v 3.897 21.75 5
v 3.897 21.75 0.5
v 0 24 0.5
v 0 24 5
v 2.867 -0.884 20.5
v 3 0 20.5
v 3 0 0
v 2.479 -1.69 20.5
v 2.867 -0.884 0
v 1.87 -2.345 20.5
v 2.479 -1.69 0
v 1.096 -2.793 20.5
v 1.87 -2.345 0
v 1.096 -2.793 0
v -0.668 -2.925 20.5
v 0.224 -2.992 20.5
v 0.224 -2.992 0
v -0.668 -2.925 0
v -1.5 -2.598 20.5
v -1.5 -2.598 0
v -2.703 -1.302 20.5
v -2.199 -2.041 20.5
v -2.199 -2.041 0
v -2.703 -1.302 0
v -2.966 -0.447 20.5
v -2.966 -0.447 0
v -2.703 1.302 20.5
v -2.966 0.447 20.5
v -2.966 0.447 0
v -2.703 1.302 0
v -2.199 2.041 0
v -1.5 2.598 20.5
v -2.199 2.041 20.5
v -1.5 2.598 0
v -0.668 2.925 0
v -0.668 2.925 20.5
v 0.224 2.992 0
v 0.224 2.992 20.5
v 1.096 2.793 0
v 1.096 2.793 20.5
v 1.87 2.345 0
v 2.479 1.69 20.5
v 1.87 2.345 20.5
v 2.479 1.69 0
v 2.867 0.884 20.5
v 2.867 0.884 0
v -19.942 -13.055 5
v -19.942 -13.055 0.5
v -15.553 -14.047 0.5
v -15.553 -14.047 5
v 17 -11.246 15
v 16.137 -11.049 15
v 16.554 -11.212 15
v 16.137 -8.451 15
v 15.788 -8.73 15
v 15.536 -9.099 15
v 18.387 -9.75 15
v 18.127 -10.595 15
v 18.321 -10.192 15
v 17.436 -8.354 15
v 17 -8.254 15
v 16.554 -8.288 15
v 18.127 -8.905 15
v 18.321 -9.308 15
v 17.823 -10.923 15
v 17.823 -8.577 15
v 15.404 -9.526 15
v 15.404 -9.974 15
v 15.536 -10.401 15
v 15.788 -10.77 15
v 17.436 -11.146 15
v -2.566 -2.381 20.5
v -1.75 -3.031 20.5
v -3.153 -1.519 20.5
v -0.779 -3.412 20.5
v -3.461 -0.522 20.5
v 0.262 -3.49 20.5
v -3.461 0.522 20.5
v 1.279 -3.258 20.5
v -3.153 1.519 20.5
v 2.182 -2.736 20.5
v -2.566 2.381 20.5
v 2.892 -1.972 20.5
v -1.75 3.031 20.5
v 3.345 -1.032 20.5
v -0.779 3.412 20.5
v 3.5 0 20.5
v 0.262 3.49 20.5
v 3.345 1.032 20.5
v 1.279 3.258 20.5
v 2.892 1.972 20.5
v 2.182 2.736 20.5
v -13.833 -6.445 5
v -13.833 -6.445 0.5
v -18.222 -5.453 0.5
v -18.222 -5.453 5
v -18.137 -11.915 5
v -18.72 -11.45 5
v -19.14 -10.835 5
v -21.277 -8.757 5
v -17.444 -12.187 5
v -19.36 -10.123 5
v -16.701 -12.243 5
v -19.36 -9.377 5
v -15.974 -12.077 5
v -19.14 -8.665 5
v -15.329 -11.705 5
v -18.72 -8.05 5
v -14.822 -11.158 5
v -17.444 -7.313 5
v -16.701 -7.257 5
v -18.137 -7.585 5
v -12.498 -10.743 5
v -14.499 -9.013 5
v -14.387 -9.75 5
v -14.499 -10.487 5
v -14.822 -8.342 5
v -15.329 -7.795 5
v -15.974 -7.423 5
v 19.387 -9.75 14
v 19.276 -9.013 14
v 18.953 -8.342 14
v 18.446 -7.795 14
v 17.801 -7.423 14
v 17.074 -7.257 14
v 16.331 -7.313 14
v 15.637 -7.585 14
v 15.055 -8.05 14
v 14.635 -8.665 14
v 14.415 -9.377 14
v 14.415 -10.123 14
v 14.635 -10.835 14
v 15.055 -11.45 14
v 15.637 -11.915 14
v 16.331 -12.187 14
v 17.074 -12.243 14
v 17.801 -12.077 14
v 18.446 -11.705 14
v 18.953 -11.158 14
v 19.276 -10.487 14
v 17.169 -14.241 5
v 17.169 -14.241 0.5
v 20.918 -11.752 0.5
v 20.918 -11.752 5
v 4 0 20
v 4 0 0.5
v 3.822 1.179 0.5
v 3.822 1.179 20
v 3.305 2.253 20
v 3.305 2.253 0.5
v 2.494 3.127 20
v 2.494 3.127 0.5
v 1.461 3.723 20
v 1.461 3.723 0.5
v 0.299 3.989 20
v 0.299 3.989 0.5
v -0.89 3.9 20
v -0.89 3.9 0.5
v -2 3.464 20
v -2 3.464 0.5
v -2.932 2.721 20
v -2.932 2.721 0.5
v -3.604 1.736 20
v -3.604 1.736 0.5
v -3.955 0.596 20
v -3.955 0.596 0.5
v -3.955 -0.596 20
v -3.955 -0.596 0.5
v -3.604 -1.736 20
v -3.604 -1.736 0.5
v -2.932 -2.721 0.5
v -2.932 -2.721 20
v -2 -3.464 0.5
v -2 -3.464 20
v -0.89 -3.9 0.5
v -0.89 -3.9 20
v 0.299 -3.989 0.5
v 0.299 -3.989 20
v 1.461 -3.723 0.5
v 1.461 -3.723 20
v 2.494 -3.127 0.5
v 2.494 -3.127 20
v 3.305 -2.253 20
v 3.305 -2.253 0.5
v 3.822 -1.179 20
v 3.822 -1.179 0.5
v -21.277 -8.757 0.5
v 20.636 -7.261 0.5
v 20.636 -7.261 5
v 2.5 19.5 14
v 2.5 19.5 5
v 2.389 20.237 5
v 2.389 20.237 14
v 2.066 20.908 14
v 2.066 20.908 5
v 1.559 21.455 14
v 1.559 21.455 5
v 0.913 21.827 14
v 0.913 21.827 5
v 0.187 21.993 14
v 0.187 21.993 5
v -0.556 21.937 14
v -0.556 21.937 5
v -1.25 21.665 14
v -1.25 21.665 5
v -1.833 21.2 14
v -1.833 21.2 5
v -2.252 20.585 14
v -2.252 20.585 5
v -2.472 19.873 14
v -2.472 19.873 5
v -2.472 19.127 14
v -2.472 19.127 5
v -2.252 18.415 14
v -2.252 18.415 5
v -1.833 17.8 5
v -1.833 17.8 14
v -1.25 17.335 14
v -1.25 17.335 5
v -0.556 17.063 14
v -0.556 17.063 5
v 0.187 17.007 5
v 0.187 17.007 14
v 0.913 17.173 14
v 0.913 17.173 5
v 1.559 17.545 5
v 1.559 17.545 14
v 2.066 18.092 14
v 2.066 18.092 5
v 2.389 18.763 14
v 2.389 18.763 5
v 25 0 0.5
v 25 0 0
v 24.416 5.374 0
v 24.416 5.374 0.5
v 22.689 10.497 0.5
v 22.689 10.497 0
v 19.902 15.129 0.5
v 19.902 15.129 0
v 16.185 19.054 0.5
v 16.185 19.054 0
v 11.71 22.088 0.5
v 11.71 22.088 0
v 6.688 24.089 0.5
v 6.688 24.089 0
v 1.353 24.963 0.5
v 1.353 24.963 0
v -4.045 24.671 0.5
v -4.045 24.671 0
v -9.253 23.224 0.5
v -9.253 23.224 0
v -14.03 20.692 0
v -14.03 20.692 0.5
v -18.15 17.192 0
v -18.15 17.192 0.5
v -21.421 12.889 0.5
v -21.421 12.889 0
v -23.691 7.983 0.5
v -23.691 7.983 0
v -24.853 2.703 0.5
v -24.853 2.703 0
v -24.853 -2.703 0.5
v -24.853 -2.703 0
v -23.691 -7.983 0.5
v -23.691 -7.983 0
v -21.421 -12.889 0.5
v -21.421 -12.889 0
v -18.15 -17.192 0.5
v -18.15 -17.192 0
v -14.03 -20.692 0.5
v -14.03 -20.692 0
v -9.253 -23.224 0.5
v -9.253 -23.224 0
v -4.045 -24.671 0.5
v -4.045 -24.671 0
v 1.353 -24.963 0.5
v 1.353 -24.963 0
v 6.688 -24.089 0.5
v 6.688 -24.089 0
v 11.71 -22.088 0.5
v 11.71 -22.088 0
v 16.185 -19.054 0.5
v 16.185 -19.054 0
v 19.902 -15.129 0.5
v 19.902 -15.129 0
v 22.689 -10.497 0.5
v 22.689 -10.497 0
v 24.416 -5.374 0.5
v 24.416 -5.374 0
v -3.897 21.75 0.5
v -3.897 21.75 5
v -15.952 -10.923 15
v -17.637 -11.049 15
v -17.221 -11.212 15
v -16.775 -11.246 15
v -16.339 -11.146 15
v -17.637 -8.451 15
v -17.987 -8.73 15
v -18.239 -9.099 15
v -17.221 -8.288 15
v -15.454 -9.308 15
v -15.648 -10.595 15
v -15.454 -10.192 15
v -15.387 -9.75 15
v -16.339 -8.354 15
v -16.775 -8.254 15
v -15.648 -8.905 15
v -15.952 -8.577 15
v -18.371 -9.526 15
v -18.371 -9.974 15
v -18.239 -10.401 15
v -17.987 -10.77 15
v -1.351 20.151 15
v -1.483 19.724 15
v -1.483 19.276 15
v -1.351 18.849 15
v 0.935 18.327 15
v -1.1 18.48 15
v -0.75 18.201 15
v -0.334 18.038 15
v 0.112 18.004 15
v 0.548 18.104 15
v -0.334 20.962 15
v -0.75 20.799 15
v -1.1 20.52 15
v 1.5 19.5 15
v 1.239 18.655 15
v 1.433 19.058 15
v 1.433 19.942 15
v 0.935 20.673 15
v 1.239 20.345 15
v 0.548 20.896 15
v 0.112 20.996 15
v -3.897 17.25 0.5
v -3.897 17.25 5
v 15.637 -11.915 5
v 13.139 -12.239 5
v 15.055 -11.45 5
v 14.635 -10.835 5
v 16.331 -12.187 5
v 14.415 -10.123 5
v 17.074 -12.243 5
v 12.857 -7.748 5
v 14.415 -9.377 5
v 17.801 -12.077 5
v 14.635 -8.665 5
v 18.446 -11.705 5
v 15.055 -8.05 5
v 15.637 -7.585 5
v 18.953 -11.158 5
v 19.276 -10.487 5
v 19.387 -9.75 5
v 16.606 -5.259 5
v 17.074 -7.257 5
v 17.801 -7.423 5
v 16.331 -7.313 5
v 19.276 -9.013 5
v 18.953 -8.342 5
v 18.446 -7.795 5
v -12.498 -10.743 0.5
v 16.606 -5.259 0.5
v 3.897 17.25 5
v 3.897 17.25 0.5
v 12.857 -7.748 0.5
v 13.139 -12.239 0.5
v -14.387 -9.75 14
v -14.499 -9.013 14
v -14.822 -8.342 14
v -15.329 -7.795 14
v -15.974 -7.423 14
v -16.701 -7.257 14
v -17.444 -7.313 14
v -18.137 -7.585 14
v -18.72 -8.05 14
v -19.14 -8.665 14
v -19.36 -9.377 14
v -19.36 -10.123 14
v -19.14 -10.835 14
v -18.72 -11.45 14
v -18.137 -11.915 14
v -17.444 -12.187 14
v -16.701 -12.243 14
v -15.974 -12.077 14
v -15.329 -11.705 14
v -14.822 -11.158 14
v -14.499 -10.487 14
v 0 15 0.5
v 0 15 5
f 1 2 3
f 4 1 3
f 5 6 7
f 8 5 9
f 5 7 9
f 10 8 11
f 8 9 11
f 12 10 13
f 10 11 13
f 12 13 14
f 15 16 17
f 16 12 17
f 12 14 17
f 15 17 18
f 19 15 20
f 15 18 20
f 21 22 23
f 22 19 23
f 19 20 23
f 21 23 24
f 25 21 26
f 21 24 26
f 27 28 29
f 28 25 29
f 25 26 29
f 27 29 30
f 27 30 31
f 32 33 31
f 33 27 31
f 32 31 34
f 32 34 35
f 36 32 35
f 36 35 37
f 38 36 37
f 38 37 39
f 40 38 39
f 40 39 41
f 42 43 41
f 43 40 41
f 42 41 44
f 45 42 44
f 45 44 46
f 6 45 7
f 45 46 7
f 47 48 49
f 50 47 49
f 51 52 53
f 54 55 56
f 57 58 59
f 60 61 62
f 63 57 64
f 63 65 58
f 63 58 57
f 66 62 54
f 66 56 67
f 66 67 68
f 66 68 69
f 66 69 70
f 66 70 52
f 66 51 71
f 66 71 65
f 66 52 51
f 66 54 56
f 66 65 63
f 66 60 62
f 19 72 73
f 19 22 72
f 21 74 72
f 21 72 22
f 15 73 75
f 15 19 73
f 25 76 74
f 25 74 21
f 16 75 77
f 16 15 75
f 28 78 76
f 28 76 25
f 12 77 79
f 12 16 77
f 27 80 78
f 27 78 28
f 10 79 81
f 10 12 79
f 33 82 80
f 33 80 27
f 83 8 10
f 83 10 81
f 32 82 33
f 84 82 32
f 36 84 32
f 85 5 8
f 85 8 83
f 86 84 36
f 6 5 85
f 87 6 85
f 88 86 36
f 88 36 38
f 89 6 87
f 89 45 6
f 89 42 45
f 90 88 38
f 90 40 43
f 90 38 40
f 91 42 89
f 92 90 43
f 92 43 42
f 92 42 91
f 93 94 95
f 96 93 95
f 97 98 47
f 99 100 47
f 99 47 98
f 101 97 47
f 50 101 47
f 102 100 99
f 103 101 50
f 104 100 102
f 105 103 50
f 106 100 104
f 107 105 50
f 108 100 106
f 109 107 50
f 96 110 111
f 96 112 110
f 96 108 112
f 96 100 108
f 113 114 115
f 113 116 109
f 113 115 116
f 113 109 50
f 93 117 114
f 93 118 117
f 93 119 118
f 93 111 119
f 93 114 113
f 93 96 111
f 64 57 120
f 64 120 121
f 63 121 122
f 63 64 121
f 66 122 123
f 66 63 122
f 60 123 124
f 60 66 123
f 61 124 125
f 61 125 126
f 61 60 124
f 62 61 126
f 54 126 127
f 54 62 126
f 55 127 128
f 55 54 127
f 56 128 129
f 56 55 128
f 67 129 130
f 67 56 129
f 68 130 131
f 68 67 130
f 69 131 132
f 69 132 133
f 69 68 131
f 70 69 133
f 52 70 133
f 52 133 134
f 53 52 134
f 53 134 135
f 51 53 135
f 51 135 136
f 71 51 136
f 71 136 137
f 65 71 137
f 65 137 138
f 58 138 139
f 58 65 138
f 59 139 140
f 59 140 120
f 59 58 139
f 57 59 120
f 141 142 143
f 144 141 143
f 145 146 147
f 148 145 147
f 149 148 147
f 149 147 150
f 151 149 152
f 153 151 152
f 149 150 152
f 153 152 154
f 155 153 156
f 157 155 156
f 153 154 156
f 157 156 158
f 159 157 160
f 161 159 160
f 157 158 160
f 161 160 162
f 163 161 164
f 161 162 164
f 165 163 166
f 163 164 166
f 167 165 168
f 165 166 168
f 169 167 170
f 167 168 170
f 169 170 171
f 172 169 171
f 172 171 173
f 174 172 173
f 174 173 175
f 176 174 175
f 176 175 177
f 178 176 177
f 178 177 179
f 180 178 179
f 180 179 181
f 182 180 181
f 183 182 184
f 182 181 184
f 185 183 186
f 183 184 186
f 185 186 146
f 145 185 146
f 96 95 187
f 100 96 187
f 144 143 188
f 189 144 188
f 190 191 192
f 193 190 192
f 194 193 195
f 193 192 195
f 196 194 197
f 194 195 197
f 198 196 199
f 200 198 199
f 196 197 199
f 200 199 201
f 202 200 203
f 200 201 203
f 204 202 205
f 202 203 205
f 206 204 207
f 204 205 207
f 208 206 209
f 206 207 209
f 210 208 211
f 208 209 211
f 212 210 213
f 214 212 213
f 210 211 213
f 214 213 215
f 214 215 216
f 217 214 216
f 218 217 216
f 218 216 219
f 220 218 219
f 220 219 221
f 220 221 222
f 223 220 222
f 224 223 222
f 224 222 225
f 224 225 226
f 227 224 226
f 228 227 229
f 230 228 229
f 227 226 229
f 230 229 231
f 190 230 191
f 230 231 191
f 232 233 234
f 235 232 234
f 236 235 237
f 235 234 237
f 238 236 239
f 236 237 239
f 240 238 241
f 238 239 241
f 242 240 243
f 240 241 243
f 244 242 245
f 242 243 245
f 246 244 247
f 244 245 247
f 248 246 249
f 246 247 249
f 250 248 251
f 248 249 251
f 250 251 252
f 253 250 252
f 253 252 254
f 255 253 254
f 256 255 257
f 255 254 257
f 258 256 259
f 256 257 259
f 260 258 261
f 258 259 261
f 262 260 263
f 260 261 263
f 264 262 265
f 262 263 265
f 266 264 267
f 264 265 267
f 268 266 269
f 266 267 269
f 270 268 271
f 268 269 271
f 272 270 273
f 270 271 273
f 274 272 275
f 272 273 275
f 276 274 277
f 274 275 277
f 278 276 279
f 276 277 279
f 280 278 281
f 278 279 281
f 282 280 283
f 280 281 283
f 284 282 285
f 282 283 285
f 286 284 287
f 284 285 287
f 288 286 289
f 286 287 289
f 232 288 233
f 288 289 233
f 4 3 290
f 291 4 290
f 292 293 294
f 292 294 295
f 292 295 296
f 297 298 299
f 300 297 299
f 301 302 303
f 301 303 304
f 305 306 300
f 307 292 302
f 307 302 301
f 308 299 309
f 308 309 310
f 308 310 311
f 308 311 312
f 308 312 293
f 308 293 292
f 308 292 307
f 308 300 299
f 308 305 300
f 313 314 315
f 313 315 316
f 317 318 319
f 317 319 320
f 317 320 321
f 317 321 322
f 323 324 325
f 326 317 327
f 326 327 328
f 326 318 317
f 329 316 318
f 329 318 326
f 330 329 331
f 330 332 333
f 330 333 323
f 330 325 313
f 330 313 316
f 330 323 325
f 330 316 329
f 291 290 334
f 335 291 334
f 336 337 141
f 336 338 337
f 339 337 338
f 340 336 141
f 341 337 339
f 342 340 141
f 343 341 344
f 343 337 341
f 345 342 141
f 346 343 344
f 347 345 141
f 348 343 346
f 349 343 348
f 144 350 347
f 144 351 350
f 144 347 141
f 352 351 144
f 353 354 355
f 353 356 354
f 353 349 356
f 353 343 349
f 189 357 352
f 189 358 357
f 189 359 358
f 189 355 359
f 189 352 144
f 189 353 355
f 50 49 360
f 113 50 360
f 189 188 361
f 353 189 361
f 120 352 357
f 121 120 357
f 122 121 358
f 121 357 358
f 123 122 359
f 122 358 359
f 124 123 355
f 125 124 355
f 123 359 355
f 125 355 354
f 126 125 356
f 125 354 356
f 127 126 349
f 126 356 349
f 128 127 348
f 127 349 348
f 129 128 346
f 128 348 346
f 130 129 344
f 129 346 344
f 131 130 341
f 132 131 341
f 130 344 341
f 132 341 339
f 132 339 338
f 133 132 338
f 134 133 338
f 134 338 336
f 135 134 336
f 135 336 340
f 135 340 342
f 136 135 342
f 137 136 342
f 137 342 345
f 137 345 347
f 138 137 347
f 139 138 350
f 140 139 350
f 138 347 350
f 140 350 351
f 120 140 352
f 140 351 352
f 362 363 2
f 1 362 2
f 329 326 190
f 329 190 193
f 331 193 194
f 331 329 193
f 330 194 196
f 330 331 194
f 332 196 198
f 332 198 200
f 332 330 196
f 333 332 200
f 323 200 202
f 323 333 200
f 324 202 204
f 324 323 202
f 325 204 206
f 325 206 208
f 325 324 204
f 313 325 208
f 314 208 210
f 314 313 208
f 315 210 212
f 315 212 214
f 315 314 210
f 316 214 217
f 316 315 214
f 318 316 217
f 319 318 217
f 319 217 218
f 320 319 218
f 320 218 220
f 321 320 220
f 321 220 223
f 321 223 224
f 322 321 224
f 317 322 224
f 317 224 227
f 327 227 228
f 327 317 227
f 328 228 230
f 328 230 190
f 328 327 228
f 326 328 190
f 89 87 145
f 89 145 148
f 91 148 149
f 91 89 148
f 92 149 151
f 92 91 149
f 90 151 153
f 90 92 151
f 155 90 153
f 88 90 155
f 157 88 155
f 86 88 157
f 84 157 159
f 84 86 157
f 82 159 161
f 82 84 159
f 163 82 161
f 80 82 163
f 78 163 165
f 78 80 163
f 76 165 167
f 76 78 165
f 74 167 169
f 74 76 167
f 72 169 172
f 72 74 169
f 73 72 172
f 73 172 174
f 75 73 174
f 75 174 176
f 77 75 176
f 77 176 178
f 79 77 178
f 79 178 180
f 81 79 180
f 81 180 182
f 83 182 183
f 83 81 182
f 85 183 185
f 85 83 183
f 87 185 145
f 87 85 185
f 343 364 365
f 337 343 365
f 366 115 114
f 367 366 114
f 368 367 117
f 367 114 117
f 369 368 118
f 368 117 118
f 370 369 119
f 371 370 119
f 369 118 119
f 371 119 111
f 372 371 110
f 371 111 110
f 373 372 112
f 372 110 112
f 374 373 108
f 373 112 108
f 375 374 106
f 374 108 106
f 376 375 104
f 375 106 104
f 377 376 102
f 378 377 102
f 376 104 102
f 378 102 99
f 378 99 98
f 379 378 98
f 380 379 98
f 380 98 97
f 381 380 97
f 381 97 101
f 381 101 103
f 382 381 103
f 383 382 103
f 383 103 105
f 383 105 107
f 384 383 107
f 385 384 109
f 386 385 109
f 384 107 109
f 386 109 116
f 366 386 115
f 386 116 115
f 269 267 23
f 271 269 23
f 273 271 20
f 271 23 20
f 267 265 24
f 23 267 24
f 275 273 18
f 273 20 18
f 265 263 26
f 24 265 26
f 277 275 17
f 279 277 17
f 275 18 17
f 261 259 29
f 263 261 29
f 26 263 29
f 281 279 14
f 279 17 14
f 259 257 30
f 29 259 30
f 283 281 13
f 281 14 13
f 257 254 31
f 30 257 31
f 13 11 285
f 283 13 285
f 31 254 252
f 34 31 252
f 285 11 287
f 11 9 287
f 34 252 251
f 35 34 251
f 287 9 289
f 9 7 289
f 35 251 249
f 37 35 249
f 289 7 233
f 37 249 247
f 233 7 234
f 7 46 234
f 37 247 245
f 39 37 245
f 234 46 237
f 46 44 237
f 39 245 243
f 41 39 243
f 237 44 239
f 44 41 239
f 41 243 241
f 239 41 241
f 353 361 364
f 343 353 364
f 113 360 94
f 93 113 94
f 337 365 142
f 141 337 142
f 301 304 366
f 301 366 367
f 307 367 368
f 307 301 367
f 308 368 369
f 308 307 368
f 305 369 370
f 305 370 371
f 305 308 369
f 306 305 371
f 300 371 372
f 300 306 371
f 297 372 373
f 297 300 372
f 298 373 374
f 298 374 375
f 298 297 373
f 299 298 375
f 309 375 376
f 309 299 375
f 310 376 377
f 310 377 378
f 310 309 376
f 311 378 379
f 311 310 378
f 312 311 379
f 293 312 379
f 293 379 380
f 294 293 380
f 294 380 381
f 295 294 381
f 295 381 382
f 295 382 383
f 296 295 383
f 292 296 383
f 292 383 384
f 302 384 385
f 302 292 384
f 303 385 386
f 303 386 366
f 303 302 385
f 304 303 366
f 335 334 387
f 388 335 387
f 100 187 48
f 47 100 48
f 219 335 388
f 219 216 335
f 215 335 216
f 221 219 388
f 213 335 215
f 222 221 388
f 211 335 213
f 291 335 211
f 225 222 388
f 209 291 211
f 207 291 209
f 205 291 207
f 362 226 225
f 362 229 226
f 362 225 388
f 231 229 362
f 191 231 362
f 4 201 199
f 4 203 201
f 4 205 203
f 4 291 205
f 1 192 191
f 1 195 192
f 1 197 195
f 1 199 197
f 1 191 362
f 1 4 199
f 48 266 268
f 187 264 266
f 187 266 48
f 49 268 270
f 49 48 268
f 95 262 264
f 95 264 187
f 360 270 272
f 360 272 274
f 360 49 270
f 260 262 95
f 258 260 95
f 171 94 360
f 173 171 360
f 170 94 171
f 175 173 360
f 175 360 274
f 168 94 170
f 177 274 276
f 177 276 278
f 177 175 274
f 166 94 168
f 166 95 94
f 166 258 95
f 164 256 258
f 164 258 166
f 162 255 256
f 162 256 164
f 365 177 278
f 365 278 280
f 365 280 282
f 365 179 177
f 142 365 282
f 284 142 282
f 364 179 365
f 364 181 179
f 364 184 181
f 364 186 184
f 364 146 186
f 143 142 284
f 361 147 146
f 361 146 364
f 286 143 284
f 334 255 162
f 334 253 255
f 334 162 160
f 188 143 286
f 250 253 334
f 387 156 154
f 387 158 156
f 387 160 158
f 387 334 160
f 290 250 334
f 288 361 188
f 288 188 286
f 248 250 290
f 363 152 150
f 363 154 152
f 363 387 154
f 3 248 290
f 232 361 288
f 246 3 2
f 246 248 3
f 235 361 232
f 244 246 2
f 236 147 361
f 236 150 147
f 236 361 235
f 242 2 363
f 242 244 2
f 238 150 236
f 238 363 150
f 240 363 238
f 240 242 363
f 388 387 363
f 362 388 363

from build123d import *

# Parameters (mm, degrees)
SKETCH001_R     = 25
PAD_DEPTH       = 0.5
PAD001_DEPTH    = 5
SKETCH002_R     = 2.5
PAD002_DEPTH    = 10
SKETCH003_R     = 4
SKETCH003_R_2   = 3
PAD003_DEPTH    = 20
SKETCH004_R     = 3
POCKET_DEPTH    = 20.501
CHAMFER_SIZE    = 1
CHAMFER001_SIZE = 0.5


with BuildPart() as part:
    # Sketch001 → Pad (new body)
    with BuildSketch(Plane.XY):
        Circle(SKETCH001_R)
    extrude(amount=PAD_DEPTH)

    # Sketch → Pad001 (join)
    with BuildSketch(Plane.XY):
        Polygon((0, 24), (-3.897114, 21.75), (-3.897114, 17.25), (0, 15), (3.897114, 17.25), (3.897114, 21.75), align=None)
        Polygon((16.606239, -5.258798), (12.857372, -7.747974), (13.138629, -12.239176), (17.168752, -14.241202), (20.917619, -11.752026), (20.636362, -7.260824), align=None)
        Polygon((-18.222418, -5.452561), (-21.276648, -8.757357), (-19.941725, -13.054796), (-15.552573, -14.047439), (-12.498343, -10.742643), (-13.833265, -6.445204), align=None)
    extrude(amount=PAD001_DEPTH)

    # Sketch002 (on Face25 of Pad001) → Pad002 (join)
    with BuildSketch(Plane.XY.offset(5)):
        with Locations((0, 19.5)):
            Circle(SKETCH002_R)
        with Locations((16.887495, -9.75)):
            Circle(SKETCH002_R)
        with Locations((-16.887495, -9.75)):
            Circle(SKETCH002_R)
    extrude(amount=PAD002_DEPTH)

    # Sketch003 (on Face3 of Pad002) → Pad003 (join)
    with BuildSketch(Plane.XY.offset(0.5)):
        Circle(SKETCH003_R)
        Circle(SKETCH003_R_2, mode=Mode.SUBTRACT)
    extrude(amount=PAD003_DEPTH)

    # Sketch004 (on Face2 of Pad003) → Pocket (cut, through all)
    with BuildSketch(Plane(origin=(0, 0, 0), x_dir=(1, 0, 0), z_dir=(0, 0, -1))):
        Circle(SKETCH004_R)
    extrude(amount=-POCKET_DEPTH, mode=Mode.SUBTRACT)

    # Chamfer
    chamfer_edges = [part.edges().sort_by_distance(p)[0] for p in [
        (-19.387495, -9.75, 15),
        (-2.5, 19.5, 15),
        (14.387495, -9.75, 15),
    ]]
    chamfer(chamfer_edges, length=CHAMFER_SIZE)

    # Chamfer001
    chamfer001_edges = [part.edges().sort_by_distance(p)[0] for p in [
        (-4, 0, 20.5),
    ]]
    chamfer(chamfer001_edges, length=CHAMFER001_SIZE)


solid = part.part
